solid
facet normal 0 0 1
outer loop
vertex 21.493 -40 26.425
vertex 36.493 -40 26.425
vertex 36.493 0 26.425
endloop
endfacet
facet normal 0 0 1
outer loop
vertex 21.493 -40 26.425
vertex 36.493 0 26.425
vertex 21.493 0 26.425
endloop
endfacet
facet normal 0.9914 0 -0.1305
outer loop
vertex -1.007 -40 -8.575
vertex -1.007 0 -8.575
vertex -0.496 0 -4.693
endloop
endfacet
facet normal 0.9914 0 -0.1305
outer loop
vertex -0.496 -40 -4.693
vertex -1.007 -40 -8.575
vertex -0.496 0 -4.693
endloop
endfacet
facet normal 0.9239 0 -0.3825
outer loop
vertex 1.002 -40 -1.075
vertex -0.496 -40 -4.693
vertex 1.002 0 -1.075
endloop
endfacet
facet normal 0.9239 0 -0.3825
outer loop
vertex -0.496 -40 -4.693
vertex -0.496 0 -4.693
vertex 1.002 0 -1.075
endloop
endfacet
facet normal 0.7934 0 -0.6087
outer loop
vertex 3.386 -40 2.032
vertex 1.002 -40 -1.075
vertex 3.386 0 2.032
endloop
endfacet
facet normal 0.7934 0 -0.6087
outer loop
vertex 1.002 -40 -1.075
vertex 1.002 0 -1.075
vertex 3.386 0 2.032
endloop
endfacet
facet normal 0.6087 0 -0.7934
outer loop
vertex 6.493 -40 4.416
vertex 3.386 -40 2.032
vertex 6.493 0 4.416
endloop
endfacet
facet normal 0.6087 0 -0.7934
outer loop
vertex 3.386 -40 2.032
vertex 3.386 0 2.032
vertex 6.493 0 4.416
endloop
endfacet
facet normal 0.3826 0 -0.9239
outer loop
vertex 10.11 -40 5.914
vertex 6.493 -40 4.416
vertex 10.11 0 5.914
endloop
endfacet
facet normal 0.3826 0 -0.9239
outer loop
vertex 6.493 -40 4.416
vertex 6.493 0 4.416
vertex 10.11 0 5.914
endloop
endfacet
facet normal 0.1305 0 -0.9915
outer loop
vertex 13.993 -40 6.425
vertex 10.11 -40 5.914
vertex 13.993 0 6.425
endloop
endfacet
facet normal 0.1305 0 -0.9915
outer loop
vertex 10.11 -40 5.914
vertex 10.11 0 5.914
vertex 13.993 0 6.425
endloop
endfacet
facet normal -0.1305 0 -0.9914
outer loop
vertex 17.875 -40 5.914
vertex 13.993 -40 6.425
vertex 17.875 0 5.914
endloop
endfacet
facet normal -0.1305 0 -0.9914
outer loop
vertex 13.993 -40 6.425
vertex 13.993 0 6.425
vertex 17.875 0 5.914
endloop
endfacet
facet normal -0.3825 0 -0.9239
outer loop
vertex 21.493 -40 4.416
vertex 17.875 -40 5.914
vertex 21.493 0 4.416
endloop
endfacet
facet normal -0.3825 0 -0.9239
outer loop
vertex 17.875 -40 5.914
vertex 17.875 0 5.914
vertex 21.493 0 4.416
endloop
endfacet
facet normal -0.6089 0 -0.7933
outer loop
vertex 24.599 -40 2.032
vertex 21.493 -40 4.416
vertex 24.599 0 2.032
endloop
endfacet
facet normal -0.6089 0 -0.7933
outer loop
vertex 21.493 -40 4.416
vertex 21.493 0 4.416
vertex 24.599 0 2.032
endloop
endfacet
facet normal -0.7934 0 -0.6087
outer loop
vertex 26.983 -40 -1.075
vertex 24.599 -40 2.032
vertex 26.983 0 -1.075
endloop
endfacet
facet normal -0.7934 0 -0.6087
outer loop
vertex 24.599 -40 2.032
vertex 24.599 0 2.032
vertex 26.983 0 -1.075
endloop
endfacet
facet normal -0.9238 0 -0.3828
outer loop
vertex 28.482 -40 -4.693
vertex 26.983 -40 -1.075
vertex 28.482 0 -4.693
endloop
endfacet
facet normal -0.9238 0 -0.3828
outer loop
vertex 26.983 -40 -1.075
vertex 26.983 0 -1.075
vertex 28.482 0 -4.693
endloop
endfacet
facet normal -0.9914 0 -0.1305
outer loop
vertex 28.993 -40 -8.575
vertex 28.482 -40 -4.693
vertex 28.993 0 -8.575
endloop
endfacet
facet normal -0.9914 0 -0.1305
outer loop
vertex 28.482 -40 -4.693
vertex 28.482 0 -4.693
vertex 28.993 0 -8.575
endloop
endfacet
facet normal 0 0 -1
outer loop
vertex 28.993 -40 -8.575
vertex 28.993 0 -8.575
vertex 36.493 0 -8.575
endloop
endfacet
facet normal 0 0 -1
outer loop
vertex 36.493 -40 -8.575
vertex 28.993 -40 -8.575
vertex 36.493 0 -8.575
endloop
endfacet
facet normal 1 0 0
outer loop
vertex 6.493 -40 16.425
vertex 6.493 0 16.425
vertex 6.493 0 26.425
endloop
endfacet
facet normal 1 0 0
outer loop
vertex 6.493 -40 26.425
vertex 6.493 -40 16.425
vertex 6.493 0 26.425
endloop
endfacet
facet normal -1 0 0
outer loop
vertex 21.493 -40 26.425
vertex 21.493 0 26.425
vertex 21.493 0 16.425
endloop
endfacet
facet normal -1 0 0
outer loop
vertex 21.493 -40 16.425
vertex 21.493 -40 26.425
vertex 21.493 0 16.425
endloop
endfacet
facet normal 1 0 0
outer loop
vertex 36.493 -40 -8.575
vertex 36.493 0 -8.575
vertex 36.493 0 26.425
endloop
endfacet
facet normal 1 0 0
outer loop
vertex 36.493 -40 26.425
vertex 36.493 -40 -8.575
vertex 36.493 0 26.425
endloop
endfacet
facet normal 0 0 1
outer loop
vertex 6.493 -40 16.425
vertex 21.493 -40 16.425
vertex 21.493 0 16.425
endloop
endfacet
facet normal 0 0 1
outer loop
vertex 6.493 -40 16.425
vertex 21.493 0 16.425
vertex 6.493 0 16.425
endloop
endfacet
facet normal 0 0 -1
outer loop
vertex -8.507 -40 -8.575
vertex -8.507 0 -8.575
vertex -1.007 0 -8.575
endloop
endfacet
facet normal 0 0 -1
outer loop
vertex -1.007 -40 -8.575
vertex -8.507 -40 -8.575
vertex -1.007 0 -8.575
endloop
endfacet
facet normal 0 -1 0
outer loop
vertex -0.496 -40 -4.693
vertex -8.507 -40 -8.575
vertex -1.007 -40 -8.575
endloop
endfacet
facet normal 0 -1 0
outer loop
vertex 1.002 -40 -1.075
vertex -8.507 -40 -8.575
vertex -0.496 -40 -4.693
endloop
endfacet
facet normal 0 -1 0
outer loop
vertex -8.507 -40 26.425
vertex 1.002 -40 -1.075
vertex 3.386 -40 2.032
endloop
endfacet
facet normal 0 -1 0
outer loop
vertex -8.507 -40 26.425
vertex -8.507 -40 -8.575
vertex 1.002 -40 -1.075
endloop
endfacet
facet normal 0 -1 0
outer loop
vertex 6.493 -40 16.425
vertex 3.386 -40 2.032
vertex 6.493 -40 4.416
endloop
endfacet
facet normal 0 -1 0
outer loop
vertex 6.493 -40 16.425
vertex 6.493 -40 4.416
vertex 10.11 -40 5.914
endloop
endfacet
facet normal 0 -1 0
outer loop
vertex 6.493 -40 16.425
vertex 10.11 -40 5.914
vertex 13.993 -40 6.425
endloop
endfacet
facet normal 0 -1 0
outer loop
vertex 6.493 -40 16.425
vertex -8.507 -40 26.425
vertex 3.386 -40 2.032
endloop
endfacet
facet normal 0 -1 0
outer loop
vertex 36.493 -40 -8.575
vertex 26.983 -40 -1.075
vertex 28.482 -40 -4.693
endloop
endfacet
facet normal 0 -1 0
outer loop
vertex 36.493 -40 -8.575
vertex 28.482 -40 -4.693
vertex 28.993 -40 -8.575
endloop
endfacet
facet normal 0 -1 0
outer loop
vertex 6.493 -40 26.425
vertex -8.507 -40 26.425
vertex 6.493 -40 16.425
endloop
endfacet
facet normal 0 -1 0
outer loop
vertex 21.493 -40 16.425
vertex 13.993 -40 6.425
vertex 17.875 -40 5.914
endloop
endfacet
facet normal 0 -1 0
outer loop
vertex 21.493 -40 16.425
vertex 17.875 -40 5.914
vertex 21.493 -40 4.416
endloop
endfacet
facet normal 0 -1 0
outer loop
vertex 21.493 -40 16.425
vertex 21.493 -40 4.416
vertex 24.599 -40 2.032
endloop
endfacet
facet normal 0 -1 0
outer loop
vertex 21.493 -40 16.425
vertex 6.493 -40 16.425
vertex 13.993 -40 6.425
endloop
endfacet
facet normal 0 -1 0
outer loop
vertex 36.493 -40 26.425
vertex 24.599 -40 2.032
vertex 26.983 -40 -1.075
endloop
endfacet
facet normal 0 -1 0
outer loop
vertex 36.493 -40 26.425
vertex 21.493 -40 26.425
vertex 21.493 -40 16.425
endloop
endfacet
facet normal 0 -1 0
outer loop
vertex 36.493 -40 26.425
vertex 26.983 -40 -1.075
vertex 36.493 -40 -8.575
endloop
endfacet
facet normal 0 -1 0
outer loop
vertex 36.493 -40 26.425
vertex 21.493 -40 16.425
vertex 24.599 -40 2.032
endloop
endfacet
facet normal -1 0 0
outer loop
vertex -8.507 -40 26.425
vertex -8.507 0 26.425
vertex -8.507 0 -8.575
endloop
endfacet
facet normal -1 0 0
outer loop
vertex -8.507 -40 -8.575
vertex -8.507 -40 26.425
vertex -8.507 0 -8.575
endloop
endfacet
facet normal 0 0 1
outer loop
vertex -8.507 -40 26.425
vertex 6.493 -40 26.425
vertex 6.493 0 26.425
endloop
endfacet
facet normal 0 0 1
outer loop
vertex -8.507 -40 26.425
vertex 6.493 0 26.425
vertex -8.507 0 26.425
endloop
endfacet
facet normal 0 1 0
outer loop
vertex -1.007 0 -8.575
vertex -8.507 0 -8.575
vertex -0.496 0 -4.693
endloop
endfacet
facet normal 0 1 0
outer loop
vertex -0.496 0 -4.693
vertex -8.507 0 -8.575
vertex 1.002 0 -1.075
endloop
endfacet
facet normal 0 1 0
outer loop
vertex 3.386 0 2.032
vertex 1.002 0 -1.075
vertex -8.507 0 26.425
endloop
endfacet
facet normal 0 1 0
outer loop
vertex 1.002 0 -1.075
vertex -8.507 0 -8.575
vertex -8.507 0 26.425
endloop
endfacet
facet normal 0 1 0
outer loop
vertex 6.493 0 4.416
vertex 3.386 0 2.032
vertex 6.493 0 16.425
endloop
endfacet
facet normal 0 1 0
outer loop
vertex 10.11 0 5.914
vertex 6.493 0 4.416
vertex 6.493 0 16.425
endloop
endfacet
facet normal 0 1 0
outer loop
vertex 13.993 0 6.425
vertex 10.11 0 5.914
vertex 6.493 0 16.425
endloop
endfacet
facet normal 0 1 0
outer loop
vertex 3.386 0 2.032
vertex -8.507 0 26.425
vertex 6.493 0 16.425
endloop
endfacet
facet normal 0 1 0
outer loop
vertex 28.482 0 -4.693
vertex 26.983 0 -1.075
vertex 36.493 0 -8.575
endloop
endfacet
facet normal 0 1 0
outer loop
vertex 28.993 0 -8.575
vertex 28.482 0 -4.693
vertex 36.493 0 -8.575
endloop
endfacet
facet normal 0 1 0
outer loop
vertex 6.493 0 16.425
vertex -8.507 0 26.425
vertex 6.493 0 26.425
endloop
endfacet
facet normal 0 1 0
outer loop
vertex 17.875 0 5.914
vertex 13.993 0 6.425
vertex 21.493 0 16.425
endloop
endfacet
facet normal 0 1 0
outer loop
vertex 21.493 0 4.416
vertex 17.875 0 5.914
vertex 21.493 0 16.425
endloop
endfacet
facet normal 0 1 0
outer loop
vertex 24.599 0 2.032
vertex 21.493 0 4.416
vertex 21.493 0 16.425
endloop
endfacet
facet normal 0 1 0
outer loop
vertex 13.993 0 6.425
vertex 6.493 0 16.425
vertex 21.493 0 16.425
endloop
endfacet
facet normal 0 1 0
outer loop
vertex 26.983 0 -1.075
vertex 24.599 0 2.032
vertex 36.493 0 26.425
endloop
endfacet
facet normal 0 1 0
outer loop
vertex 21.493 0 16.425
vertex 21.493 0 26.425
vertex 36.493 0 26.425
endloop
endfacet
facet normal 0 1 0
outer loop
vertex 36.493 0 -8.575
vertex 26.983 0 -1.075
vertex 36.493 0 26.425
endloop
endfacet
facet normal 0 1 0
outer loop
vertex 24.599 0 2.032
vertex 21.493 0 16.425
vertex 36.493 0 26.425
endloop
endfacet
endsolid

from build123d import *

# Parameters (mm, degrees)
F1_DEPTH = 40


with BuildPart() as f1:
    # F0 (on Front) → F1 (new body)
    with BuildSketch(Plane.XZ):
        with BuildLine():
            Line((6.492765, 26.425125), (-8.507235, 26.425125))
            Line((-8.507235, 26.425125), (-8.507235, -8.574875))
            Line((-8.507235, -8.574875), (-1.007235, -8.574875))
            ThreePointArc((-1.007235, -8.574875), (13.992765, 6.425125), (28.992765, -8.574875))
            Line((28.992765, -8.574875), (36.492765, -8.574875))
            Line((36.492765, -8.574875), (36.492765, 26.425125))
            Line((36.492765, 26.425125), (21.492765, 26.425125))
            Line((21.492765, 26.425125), (21.492765, 16.425125))
            Line((21.492765, 16.425125), (6.492765, 16.425125))
            Line((6.492765, 16.425125), (6.492765, 26.425125))
        make_face()
    extrude(amount=F1_DEPTH)


solid = f1.part
